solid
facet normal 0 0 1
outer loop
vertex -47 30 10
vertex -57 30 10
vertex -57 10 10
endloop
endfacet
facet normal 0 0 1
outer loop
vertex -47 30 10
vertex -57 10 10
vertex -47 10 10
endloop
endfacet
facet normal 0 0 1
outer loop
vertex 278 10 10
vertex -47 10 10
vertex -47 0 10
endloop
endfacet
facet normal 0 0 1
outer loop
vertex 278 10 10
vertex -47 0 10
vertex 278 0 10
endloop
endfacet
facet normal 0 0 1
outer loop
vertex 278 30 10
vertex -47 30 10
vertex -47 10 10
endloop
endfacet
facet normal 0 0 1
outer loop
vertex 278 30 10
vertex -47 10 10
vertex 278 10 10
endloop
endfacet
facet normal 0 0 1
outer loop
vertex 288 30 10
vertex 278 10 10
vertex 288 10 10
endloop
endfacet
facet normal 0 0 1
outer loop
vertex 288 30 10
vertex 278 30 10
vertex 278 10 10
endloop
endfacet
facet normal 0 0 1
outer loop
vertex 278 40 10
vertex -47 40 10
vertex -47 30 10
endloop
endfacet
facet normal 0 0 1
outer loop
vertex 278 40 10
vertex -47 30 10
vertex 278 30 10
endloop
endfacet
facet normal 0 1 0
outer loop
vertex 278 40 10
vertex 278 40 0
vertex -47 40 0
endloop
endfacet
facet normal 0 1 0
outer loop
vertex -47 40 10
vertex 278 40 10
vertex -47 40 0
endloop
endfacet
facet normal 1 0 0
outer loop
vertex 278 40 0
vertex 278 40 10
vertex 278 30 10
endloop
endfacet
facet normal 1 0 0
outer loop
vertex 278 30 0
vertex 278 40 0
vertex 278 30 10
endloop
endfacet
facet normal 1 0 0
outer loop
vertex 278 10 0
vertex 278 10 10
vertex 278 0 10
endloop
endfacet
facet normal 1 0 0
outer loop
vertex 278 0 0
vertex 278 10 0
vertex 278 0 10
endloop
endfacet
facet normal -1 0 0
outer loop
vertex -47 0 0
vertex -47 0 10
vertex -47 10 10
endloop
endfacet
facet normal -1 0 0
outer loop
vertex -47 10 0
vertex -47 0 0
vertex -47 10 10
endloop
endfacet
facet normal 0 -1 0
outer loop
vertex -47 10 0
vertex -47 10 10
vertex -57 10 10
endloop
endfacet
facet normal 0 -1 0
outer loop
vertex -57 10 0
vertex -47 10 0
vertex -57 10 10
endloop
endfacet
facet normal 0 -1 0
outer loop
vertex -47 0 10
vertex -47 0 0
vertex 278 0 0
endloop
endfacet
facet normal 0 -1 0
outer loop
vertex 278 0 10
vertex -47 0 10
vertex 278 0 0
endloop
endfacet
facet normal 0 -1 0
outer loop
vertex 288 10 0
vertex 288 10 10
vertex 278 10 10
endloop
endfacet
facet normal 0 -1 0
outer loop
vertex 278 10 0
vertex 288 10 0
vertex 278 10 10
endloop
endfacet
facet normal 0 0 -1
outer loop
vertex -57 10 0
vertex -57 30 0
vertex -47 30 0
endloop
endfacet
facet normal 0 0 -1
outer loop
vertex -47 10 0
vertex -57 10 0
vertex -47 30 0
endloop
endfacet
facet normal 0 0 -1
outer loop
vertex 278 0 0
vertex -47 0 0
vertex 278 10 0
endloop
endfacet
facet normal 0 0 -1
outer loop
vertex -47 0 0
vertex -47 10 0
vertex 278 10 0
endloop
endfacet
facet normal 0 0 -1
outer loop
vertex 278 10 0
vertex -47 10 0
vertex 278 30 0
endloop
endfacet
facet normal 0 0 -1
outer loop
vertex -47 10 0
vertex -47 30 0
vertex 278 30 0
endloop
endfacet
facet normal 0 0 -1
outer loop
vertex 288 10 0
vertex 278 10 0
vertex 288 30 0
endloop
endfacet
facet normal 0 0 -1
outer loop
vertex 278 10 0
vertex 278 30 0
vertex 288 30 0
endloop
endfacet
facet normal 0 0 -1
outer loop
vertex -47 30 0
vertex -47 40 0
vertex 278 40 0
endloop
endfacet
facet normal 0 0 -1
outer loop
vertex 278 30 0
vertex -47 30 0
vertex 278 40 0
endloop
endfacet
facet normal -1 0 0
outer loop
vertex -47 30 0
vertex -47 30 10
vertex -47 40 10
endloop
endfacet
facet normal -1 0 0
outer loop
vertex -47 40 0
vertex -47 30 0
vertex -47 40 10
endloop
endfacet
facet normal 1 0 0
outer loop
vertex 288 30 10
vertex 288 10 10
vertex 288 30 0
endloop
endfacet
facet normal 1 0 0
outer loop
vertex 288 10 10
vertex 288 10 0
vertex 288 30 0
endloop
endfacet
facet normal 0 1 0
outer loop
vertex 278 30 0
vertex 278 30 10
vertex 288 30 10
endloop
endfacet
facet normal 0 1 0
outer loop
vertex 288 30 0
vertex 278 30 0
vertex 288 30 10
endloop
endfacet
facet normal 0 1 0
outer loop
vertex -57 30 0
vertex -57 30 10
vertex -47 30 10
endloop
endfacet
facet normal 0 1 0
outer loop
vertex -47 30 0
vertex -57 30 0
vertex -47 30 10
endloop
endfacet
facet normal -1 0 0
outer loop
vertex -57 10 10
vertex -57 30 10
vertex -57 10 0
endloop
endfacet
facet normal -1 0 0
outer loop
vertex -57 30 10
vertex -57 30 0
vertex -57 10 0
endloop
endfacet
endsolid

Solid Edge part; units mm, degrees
sketch "Sketch1" plane through (0, 0, 0) normal (0, 0, 1) x (1, 0, 0)
  line L0 (-57, 0) -> (288, 0)
  line L1 (288, 0) -> (288, 40)
  line L2 (288, 40) -> (-57, 40)
  line L3 (-57, 40) -> (-57, 0)
extrude "Protrusion1" add sketch "Sketch1" along normal blind 10
sketch "Sketch2" plane through (115.5, 20, 10) normal (0, 0, 1) x (1, 0, 0)
  line L0 (-172.5, 20) -> (-172.5, 10)
  line L1 (-172.5, 10) -> (-162.5, 10)
  line L2 (-162.5, 10) -> (-162.5, 20)
  line L3 (-162.5, 20) -> (-172.5, 20)
  line L4 (-172.5, -20) -> (-162.5, -20)
  line L5 (-162.5, -20) -> (-162.5, -10)
  line L6 (-162.5, -10) -> (-172.5, -10)
  line L7 (-172.5, -10) -> (-172.5, -20)
  line L8 (172.5, 20) -> (162.5, 20)
  line L9 (162.5, 20) -> (162.5, 10)
  line L10 (162.5, 10) -> (172.5, 10)
  line L11 (172.5, 10) -> (172.5, 20)
  line L12 (172.5, -20) -> (172.5, -10)
  line L13 (172.5, -10) -> (162.5, -10)
  line L14 (162.5, -10) -> (162.5, -20)
  line L15 (162.5, -20) -> (172.5, -20)
extrude "VaciadoExtruido_1" cut sketch "Sketch2" against normal blind 85.725
